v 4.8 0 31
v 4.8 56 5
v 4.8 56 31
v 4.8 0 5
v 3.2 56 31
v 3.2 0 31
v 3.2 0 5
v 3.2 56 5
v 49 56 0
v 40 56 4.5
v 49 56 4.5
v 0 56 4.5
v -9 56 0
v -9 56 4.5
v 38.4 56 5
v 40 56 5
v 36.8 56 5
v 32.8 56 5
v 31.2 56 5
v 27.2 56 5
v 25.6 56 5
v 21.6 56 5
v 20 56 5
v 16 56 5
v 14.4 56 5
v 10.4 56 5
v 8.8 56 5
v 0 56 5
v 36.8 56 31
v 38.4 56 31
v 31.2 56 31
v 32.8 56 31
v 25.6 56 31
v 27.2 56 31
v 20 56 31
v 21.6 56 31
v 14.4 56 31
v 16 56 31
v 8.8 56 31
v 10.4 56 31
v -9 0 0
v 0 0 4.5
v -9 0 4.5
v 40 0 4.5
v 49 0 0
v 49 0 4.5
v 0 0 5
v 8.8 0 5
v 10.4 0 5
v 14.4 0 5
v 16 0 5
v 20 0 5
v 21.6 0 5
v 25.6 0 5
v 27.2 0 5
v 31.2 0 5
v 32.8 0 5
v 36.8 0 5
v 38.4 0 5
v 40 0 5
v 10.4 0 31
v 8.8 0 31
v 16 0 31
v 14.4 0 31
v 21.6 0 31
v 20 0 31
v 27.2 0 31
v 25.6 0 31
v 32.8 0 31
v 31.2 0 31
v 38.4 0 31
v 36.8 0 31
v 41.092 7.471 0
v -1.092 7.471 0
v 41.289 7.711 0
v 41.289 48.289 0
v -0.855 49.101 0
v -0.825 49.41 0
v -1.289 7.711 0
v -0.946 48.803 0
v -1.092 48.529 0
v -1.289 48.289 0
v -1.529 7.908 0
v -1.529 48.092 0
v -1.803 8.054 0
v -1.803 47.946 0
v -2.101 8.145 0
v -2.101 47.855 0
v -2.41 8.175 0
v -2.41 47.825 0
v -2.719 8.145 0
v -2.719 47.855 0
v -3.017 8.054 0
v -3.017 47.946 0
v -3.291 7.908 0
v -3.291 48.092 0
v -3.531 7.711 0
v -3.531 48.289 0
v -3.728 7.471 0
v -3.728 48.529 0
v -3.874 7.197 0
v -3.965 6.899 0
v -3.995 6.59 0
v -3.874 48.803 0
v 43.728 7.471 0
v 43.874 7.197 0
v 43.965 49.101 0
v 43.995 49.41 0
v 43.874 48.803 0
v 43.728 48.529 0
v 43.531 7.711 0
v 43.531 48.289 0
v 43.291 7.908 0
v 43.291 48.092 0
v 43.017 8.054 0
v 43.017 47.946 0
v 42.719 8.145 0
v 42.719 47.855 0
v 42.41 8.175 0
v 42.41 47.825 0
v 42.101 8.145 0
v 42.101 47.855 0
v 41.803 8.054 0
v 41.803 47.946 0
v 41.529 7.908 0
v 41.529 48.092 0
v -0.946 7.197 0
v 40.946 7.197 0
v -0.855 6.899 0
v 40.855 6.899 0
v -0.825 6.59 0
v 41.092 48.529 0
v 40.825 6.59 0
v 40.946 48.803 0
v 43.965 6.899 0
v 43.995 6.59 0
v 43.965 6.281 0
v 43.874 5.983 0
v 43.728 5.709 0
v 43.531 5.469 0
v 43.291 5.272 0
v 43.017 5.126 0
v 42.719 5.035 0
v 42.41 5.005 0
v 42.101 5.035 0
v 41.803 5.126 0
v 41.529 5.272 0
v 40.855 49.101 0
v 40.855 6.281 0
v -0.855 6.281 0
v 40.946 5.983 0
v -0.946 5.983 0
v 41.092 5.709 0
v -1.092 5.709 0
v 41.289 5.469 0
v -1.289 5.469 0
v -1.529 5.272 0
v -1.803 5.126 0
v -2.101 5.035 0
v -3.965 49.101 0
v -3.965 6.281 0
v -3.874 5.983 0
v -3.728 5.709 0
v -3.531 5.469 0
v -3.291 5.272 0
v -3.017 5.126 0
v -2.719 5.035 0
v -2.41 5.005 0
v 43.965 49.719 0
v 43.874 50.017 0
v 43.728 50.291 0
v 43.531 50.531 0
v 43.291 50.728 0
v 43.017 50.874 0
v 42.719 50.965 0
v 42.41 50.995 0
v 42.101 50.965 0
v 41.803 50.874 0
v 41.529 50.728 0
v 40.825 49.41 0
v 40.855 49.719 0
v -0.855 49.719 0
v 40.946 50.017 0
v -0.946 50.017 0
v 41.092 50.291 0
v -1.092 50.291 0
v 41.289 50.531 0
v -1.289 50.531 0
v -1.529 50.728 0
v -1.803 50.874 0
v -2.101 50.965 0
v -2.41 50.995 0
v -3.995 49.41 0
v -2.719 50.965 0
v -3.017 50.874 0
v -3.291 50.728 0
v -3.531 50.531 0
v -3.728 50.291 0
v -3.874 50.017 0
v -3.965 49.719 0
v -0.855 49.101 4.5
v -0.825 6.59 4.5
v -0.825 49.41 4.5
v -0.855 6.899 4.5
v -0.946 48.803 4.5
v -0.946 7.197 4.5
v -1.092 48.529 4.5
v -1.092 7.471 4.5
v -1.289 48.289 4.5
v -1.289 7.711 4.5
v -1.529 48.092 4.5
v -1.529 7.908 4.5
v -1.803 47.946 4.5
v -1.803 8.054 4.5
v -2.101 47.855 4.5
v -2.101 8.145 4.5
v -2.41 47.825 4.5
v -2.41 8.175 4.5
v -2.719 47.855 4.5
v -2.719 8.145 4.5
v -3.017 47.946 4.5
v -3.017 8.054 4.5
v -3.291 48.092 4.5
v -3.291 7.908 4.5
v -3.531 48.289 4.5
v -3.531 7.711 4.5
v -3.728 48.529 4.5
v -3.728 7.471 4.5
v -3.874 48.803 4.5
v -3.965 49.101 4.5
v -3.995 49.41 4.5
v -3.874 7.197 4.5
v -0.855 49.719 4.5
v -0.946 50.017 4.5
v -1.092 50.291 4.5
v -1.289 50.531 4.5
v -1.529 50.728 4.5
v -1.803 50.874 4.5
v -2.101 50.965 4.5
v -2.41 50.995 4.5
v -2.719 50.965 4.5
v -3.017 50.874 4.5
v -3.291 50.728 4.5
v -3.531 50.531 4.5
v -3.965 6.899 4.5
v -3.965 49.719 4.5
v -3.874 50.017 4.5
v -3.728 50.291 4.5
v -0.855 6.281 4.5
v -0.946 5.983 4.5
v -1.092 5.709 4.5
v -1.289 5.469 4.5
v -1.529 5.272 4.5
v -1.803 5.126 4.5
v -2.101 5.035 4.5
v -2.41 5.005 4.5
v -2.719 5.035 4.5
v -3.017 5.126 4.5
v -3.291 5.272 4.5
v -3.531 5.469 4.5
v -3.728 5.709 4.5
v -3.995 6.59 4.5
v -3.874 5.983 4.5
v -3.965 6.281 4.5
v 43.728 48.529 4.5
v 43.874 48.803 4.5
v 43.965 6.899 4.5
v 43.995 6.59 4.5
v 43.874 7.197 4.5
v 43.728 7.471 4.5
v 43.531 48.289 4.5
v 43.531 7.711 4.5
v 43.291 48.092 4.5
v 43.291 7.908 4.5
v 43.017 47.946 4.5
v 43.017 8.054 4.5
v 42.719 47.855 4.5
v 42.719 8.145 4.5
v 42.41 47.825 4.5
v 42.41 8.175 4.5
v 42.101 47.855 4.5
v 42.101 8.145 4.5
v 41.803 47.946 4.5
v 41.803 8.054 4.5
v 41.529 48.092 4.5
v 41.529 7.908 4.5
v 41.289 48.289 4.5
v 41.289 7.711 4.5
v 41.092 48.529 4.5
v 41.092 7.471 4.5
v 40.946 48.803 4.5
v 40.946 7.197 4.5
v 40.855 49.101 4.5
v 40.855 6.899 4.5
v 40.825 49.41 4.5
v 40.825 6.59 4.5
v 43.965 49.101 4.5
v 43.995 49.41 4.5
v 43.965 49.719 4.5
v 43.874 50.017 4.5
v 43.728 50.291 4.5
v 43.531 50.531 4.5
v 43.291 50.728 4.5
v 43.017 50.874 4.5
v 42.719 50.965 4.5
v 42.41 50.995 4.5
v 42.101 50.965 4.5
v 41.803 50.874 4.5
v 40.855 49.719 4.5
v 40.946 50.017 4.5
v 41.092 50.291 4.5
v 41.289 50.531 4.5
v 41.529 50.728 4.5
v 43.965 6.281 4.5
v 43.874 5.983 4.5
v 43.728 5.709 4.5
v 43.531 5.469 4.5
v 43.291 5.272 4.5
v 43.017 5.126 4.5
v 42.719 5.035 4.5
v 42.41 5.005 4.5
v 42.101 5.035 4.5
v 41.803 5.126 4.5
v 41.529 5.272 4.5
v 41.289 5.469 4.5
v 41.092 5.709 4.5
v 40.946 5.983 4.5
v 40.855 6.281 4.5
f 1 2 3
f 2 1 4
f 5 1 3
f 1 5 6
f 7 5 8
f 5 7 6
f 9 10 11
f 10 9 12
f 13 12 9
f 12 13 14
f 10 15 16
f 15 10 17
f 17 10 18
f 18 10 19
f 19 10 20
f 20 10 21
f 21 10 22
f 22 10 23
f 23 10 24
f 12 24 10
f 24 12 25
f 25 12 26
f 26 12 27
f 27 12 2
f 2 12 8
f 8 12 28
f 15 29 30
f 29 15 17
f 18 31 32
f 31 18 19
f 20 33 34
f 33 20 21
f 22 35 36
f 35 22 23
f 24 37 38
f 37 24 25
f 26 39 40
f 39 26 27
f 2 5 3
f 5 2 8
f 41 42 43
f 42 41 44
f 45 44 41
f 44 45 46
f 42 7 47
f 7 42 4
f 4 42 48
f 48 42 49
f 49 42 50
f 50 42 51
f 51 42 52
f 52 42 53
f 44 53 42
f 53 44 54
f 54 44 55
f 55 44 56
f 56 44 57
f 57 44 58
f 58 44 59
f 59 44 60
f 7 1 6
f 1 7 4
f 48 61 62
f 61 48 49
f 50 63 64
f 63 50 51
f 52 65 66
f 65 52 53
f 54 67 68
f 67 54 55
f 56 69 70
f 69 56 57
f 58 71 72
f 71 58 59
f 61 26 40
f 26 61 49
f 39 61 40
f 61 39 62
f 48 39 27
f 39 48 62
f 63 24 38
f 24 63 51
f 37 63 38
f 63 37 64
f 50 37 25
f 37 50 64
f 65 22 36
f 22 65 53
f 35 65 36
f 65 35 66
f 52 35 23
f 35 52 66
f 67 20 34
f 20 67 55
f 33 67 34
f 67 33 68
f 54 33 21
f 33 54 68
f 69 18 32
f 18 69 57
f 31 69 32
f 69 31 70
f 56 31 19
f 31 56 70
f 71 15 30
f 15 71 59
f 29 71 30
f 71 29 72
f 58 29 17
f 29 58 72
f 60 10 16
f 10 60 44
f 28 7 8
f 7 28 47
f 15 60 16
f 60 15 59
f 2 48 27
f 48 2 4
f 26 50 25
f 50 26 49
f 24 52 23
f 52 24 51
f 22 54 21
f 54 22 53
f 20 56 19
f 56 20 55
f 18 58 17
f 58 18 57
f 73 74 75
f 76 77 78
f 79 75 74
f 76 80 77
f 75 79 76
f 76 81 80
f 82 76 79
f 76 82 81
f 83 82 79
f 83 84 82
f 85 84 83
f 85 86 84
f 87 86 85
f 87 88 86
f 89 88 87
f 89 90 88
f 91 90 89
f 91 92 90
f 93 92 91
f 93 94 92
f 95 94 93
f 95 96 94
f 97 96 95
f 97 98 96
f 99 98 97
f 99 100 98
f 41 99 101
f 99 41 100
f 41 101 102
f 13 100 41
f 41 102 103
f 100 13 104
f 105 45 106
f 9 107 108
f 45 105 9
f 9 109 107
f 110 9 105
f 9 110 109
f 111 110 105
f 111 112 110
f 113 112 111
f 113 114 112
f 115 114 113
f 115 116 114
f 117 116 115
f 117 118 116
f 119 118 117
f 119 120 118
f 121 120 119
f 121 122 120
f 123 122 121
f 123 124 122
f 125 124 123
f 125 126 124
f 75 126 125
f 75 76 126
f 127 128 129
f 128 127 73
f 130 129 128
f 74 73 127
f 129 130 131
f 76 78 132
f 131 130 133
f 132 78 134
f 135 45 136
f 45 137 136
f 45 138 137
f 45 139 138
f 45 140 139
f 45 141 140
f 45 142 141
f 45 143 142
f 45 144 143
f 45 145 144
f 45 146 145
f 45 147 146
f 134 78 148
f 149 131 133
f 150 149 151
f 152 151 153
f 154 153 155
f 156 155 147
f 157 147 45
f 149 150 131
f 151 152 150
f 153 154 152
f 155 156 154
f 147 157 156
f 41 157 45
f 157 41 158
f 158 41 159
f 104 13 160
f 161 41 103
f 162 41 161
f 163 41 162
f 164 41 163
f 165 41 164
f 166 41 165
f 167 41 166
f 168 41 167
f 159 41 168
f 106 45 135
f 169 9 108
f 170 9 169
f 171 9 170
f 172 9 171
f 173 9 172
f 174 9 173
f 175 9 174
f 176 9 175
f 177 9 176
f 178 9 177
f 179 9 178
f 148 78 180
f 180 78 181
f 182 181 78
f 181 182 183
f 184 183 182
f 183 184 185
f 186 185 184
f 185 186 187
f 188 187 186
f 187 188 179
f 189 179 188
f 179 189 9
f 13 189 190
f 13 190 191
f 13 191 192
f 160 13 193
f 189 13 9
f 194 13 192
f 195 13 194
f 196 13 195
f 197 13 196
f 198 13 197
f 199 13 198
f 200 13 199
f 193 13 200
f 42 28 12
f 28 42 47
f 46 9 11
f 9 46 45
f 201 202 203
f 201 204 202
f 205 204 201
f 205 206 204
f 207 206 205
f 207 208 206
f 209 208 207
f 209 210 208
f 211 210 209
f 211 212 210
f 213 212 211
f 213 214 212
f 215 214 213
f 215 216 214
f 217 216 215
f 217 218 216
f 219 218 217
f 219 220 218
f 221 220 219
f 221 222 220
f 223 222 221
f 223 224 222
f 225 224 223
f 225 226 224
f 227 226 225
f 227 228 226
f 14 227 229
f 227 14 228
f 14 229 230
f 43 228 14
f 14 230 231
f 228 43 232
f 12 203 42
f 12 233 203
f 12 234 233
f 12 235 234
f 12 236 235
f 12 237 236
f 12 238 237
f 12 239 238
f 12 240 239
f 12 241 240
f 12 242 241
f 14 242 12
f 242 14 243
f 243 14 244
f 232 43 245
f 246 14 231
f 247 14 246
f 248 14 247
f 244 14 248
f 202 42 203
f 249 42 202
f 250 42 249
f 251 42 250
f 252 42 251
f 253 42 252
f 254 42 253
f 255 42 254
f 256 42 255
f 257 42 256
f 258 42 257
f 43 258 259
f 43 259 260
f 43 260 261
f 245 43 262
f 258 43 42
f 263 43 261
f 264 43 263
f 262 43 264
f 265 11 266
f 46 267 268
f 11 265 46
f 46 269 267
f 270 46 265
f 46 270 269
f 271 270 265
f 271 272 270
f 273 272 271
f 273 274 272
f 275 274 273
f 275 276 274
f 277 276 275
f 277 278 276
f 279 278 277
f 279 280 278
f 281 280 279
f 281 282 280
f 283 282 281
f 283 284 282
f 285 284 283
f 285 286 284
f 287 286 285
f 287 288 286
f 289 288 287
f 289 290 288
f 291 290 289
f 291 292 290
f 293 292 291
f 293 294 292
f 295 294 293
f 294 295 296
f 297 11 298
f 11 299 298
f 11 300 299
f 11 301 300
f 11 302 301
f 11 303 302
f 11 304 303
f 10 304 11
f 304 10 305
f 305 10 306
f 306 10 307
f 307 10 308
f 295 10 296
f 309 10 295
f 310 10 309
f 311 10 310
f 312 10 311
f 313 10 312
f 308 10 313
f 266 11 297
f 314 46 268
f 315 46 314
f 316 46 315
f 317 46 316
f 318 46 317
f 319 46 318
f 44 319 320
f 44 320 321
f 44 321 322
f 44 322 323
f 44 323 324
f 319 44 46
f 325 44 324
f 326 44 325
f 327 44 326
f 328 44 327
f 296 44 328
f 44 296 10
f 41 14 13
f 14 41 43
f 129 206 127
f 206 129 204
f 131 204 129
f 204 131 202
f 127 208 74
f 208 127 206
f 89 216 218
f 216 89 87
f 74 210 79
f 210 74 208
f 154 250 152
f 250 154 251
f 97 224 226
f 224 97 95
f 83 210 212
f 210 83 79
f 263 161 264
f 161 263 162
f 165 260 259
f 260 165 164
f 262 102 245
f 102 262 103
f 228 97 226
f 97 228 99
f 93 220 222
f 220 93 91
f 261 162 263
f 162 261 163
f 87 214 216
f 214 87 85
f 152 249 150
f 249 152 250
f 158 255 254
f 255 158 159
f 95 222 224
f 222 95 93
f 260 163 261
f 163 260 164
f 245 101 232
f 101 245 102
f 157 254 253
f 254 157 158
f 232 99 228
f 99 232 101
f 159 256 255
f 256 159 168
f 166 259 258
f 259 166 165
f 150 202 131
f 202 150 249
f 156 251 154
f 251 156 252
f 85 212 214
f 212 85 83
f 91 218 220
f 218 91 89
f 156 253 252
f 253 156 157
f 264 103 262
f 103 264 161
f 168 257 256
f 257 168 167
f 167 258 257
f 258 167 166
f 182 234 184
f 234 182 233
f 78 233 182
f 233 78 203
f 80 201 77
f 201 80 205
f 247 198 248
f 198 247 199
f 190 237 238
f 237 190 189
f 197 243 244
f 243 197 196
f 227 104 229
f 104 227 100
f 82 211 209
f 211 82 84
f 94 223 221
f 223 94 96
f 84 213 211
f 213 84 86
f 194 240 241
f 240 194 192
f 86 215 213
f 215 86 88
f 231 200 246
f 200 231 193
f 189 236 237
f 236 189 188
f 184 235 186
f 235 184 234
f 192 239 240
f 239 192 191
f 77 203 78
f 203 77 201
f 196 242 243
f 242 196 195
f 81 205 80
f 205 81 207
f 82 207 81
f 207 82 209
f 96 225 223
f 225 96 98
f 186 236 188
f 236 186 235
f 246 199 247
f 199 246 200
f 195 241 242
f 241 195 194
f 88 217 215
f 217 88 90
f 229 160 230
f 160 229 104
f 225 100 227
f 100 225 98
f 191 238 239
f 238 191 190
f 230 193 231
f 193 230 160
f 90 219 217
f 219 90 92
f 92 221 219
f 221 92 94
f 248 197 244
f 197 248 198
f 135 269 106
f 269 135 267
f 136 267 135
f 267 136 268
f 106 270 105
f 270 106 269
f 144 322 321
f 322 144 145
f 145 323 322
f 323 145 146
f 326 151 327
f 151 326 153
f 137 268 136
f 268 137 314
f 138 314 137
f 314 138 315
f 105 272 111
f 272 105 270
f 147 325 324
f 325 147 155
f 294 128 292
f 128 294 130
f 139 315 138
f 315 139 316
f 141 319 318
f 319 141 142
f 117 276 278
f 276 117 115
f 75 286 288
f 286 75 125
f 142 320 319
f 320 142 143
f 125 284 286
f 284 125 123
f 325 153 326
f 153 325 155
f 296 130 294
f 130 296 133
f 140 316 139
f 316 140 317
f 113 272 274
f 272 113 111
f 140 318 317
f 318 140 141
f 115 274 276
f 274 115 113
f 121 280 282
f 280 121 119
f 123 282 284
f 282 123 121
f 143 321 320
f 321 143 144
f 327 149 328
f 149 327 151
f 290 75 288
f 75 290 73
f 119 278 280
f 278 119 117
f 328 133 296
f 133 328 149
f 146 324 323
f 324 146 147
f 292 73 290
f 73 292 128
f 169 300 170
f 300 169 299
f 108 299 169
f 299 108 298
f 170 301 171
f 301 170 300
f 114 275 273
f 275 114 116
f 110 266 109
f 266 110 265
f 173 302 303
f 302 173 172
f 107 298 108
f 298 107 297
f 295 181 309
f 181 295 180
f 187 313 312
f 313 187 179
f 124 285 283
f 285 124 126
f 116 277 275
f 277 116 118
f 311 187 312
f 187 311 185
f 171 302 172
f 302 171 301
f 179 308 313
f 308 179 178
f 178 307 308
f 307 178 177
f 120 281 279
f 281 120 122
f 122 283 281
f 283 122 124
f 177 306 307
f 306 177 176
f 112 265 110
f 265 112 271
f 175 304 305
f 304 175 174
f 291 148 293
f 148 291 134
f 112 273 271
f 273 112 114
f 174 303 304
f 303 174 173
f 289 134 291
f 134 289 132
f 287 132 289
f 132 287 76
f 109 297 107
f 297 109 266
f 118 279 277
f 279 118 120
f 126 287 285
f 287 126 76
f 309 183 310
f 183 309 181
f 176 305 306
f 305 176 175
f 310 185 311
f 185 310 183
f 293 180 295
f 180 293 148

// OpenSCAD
$fn = 32;

// ----------------------------------------------------------------------
// Finned heat sink: 40 x 56 mm base, 26 mm fins
// ----------------------------------------------------------------------

// --- parameters (mm) ---
base_w = 40;              // base width
base_d = 56;              // base depth
base_t = 5;               // base thickness
fin_h = 26;               // fin height above the base
holes_d = 3.17;           // fixing holes
hole_x = 22.41;           // hole offset in x
hole_y = 21.41;           // hole offset in y
fin_t = 1.6;              // fin thickness
fin_pitch = 5.6;          // fin pitch
fin_count = 7;            // number of fins
fin_x0 = 3.2;             // first fin offset
flange_w = 58;            // flange plate width
flange_t = 4;             // flange plate thickness

difference() {
  union() {
    cube([base_w, base_d, base_t]);
    for (i = [0 : fin_count - 1]) {
      translate([fin_x0 + i * fin_pitch, 0, base_t - 0.5]) cube([fin_t, base_d, fin_h + 0.5]);
    }
    /* mounting flange, a wider plate sharing the base bottom */
    translate([(base_w - flange_w) / 2, 0, 0]) cube([flange_w, base_d, flange_t + 0.5]);
  }
  /* fixing holes through the base, 2.5 mm clear on both sides */
  for (hx = [-22.41, 22.41]) {
    for (hy = [-21.41, 21.41]) {
      translate([base_w / 2 + hx, base_d / 2 + hy, -2.5]) cylinder(h = base_t + 5, d = holes_d);
    }
  }
}
